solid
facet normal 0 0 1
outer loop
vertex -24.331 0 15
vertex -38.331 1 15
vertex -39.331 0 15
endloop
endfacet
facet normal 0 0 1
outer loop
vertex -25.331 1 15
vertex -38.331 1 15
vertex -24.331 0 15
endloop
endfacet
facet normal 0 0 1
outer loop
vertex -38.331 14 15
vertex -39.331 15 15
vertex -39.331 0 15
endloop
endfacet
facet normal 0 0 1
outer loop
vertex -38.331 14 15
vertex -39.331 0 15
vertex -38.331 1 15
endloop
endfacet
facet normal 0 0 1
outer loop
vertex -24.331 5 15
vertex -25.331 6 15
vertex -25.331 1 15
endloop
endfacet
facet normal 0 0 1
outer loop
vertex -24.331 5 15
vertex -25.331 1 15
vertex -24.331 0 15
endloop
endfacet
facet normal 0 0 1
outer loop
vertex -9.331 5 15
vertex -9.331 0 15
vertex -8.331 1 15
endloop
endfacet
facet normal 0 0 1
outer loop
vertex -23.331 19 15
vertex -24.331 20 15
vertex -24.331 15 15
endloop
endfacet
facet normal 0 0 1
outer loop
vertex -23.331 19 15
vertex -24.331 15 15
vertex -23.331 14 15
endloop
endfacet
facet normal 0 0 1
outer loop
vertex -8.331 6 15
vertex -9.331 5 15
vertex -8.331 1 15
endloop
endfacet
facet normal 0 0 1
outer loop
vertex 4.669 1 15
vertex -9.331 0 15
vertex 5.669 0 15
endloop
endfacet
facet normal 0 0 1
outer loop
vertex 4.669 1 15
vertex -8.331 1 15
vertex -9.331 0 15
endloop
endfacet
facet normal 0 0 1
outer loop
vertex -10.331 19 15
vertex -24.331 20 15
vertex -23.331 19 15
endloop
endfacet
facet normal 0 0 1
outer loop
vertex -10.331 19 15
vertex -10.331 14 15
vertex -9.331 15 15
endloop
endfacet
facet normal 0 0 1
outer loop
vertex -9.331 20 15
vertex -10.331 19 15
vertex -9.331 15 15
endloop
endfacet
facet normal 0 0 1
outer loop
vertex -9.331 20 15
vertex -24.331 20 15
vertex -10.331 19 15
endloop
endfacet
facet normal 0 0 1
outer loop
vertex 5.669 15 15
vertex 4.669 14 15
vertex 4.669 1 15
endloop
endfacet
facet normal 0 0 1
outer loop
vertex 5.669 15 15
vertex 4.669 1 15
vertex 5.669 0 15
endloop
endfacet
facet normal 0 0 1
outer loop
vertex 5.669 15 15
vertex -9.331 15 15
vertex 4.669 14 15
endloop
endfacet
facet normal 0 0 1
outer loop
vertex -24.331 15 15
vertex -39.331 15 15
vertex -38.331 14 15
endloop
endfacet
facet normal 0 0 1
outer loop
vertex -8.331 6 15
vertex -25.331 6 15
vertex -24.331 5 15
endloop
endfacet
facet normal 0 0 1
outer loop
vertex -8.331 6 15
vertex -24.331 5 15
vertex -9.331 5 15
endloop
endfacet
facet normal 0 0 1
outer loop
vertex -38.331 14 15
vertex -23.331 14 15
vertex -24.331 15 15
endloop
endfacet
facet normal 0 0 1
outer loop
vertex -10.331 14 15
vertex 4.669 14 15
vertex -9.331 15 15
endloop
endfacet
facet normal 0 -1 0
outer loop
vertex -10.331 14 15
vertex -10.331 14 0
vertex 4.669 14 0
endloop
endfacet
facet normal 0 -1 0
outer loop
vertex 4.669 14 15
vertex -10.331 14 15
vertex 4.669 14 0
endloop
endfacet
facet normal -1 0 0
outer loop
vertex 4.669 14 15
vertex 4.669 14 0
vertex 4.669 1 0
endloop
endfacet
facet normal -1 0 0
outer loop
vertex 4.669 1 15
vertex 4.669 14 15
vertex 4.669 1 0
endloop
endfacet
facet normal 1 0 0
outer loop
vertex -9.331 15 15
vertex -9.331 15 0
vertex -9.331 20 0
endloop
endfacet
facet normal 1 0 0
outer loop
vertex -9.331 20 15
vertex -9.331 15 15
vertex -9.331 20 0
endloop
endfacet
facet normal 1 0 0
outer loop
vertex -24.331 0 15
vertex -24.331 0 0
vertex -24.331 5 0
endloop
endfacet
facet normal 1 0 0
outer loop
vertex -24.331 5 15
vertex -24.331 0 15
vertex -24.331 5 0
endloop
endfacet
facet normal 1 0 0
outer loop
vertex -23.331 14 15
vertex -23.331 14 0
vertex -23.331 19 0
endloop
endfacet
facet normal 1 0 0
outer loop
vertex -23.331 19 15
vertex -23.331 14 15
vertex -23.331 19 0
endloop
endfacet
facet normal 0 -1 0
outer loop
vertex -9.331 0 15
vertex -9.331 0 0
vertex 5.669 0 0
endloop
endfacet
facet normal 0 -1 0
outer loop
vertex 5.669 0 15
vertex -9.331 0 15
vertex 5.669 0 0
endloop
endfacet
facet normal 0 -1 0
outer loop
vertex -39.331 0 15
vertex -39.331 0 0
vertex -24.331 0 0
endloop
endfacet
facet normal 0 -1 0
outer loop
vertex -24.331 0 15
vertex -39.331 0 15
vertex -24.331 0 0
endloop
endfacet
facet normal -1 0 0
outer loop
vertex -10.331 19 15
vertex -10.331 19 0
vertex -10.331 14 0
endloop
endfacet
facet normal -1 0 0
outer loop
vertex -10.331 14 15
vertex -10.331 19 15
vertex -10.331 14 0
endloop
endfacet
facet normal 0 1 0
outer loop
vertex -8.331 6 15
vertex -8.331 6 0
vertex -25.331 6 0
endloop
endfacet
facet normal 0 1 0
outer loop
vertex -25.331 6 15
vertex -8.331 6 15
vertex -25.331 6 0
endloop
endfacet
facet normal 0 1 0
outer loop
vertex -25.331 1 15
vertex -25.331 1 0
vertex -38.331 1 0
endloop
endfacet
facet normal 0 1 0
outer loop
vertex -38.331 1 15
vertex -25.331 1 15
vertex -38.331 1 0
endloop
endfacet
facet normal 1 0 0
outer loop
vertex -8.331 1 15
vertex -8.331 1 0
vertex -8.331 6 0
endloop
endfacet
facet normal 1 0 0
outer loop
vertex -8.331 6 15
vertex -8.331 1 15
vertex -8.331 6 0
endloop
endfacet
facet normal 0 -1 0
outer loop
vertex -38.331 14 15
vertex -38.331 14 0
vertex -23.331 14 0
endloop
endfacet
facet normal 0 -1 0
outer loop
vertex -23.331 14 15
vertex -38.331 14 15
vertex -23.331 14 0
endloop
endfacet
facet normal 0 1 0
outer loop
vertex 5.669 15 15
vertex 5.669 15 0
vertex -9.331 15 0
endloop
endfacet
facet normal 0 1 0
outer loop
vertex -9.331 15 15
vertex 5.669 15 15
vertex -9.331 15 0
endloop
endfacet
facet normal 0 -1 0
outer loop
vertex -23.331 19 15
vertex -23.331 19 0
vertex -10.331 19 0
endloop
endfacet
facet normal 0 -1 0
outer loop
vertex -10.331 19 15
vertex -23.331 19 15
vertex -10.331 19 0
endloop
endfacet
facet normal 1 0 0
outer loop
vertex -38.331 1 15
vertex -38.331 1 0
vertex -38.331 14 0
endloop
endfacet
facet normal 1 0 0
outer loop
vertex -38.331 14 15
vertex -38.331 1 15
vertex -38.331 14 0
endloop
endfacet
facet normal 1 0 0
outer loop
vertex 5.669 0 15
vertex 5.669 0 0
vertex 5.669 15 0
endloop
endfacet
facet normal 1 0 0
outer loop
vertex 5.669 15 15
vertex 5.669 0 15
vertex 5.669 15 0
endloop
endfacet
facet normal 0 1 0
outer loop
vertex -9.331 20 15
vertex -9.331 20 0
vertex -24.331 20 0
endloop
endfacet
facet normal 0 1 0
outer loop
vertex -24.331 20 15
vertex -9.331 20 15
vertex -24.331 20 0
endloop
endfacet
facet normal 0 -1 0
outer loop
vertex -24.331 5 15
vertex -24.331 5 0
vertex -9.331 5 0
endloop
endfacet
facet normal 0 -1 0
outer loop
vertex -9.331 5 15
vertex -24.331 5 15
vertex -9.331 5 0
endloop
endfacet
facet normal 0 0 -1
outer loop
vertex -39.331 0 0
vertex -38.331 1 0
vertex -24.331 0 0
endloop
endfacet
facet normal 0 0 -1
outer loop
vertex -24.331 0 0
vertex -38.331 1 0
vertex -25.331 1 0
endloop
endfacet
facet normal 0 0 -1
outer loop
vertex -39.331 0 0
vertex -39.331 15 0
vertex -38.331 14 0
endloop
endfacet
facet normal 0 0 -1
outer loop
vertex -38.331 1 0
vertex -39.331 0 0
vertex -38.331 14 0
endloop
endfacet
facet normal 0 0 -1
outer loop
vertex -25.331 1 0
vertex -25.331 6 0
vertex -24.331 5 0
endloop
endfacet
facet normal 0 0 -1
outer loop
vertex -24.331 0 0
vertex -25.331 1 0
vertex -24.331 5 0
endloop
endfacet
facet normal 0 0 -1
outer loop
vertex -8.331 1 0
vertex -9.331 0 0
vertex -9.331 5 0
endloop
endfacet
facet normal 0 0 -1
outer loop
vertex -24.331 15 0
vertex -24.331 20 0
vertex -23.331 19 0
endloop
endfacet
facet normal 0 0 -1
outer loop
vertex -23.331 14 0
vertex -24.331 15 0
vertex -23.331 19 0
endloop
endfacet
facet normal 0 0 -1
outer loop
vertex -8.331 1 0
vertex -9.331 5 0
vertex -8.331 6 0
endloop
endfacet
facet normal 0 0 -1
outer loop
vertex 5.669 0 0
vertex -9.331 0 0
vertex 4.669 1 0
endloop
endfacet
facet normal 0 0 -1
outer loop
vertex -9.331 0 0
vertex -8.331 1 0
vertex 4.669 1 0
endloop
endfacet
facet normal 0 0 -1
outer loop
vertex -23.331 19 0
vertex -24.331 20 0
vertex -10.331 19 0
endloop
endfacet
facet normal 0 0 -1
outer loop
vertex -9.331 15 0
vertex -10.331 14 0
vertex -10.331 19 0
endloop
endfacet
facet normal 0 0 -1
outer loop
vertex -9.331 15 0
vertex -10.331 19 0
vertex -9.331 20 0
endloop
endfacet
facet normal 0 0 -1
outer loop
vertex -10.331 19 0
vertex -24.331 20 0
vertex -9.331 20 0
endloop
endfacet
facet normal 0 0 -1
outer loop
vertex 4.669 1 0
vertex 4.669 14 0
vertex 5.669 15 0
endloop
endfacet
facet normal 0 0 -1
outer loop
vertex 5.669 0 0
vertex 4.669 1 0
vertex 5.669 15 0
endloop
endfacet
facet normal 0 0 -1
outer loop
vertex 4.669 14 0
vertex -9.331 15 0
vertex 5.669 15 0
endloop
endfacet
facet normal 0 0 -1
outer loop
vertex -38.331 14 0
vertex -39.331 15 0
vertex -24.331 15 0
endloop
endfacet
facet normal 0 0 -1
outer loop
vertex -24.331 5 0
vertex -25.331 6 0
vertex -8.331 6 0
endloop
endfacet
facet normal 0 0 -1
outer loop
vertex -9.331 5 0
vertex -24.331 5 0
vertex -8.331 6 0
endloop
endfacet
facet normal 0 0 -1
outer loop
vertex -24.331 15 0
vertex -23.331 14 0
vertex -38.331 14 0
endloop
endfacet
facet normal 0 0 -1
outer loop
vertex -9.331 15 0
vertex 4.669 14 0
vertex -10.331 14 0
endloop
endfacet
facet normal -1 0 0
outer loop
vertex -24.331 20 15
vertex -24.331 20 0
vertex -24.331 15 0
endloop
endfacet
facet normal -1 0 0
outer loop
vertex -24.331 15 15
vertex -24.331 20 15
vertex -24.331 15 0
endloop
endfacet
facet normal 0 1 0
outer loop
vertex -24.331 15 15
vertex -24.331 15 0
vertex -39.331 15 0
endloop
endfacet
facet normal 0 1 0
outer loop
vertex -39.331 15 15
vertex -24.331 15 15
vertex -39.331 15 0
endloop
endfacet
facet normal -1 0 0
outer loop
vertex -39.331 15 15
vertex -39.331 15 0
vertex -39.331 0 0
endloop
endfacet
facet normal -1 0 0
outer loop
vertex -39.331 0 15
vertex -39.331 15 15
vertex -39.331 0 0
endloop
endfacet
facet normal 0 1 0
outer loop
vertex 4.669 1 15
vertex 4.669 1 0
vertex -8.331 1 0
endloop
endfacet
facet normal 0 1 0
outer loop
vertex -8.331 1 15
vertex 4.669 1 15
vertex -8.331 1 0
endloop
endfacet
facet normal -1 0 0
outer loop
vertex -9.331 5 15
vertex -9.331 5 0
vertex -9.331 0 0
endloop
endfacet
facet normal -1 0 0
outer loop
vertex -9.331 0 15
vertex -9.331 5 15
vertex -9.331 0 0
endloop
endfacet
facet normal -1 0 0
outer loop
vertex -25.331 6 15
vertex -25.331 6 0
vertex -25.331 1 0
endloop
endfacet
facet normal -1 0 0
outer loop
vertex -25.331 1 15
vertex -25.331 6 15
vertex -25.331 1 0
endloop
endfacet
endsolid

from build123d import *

# Parameters (mm, degrees)
F2_DEPTH = 15


with BuildPart() as f2:
    # F1 (on Top) → F2 (new body)
    with BuildSketch(Plane.XY):
        Polygon((-39.3307432532, 0), (-24.3307432532, 0), (-24.3307432532, 5), (-24.3307432532, 6), (-25.3307432532, 6), (-25.3307432532, 1), (-38.3307432532, 1), (-38.3307432532, 14), (-25.3307432532, 14), (-24.3307432532, 14), (-24.3307432532, 15), (-39.3307432532, 15), align=None)
        Polygon((-24.3307432532, 6), (-24.3307432532, 5), (-9.3307432532, 5), (-9.3307432532, 6), (-10.3307432532, 6), (-23.3307432532, 6), align=None)
        Polygon((-9.3307432532, 6), (-9.3307432532, 5), (-9.3307432532, 0), (5.6692567468, 0), (5.6692567468, 15), (-9.3307432532, 15), (-9.3307432532, 14), (-8.3307432532, 14), (4.6692567468, 14), (4.6692567468, 1), (-8.3307432532, 1), (-8.3307432532, 6), align=None)
        Polygon((-24.3307432532, 20), (-24.3307432532, 15), (-24.3307432532, 14), (-23.3307432532, 14), (-23.3307432532, 19), (-10.3307432532, 19), (-10.3307432532, 14), (-9.3307432532, 14), (-9.3307432532, 15), (-9.3307432532, 20), align=None)
    extrude(amount=F2_DEPTH)


solid = f2.part
